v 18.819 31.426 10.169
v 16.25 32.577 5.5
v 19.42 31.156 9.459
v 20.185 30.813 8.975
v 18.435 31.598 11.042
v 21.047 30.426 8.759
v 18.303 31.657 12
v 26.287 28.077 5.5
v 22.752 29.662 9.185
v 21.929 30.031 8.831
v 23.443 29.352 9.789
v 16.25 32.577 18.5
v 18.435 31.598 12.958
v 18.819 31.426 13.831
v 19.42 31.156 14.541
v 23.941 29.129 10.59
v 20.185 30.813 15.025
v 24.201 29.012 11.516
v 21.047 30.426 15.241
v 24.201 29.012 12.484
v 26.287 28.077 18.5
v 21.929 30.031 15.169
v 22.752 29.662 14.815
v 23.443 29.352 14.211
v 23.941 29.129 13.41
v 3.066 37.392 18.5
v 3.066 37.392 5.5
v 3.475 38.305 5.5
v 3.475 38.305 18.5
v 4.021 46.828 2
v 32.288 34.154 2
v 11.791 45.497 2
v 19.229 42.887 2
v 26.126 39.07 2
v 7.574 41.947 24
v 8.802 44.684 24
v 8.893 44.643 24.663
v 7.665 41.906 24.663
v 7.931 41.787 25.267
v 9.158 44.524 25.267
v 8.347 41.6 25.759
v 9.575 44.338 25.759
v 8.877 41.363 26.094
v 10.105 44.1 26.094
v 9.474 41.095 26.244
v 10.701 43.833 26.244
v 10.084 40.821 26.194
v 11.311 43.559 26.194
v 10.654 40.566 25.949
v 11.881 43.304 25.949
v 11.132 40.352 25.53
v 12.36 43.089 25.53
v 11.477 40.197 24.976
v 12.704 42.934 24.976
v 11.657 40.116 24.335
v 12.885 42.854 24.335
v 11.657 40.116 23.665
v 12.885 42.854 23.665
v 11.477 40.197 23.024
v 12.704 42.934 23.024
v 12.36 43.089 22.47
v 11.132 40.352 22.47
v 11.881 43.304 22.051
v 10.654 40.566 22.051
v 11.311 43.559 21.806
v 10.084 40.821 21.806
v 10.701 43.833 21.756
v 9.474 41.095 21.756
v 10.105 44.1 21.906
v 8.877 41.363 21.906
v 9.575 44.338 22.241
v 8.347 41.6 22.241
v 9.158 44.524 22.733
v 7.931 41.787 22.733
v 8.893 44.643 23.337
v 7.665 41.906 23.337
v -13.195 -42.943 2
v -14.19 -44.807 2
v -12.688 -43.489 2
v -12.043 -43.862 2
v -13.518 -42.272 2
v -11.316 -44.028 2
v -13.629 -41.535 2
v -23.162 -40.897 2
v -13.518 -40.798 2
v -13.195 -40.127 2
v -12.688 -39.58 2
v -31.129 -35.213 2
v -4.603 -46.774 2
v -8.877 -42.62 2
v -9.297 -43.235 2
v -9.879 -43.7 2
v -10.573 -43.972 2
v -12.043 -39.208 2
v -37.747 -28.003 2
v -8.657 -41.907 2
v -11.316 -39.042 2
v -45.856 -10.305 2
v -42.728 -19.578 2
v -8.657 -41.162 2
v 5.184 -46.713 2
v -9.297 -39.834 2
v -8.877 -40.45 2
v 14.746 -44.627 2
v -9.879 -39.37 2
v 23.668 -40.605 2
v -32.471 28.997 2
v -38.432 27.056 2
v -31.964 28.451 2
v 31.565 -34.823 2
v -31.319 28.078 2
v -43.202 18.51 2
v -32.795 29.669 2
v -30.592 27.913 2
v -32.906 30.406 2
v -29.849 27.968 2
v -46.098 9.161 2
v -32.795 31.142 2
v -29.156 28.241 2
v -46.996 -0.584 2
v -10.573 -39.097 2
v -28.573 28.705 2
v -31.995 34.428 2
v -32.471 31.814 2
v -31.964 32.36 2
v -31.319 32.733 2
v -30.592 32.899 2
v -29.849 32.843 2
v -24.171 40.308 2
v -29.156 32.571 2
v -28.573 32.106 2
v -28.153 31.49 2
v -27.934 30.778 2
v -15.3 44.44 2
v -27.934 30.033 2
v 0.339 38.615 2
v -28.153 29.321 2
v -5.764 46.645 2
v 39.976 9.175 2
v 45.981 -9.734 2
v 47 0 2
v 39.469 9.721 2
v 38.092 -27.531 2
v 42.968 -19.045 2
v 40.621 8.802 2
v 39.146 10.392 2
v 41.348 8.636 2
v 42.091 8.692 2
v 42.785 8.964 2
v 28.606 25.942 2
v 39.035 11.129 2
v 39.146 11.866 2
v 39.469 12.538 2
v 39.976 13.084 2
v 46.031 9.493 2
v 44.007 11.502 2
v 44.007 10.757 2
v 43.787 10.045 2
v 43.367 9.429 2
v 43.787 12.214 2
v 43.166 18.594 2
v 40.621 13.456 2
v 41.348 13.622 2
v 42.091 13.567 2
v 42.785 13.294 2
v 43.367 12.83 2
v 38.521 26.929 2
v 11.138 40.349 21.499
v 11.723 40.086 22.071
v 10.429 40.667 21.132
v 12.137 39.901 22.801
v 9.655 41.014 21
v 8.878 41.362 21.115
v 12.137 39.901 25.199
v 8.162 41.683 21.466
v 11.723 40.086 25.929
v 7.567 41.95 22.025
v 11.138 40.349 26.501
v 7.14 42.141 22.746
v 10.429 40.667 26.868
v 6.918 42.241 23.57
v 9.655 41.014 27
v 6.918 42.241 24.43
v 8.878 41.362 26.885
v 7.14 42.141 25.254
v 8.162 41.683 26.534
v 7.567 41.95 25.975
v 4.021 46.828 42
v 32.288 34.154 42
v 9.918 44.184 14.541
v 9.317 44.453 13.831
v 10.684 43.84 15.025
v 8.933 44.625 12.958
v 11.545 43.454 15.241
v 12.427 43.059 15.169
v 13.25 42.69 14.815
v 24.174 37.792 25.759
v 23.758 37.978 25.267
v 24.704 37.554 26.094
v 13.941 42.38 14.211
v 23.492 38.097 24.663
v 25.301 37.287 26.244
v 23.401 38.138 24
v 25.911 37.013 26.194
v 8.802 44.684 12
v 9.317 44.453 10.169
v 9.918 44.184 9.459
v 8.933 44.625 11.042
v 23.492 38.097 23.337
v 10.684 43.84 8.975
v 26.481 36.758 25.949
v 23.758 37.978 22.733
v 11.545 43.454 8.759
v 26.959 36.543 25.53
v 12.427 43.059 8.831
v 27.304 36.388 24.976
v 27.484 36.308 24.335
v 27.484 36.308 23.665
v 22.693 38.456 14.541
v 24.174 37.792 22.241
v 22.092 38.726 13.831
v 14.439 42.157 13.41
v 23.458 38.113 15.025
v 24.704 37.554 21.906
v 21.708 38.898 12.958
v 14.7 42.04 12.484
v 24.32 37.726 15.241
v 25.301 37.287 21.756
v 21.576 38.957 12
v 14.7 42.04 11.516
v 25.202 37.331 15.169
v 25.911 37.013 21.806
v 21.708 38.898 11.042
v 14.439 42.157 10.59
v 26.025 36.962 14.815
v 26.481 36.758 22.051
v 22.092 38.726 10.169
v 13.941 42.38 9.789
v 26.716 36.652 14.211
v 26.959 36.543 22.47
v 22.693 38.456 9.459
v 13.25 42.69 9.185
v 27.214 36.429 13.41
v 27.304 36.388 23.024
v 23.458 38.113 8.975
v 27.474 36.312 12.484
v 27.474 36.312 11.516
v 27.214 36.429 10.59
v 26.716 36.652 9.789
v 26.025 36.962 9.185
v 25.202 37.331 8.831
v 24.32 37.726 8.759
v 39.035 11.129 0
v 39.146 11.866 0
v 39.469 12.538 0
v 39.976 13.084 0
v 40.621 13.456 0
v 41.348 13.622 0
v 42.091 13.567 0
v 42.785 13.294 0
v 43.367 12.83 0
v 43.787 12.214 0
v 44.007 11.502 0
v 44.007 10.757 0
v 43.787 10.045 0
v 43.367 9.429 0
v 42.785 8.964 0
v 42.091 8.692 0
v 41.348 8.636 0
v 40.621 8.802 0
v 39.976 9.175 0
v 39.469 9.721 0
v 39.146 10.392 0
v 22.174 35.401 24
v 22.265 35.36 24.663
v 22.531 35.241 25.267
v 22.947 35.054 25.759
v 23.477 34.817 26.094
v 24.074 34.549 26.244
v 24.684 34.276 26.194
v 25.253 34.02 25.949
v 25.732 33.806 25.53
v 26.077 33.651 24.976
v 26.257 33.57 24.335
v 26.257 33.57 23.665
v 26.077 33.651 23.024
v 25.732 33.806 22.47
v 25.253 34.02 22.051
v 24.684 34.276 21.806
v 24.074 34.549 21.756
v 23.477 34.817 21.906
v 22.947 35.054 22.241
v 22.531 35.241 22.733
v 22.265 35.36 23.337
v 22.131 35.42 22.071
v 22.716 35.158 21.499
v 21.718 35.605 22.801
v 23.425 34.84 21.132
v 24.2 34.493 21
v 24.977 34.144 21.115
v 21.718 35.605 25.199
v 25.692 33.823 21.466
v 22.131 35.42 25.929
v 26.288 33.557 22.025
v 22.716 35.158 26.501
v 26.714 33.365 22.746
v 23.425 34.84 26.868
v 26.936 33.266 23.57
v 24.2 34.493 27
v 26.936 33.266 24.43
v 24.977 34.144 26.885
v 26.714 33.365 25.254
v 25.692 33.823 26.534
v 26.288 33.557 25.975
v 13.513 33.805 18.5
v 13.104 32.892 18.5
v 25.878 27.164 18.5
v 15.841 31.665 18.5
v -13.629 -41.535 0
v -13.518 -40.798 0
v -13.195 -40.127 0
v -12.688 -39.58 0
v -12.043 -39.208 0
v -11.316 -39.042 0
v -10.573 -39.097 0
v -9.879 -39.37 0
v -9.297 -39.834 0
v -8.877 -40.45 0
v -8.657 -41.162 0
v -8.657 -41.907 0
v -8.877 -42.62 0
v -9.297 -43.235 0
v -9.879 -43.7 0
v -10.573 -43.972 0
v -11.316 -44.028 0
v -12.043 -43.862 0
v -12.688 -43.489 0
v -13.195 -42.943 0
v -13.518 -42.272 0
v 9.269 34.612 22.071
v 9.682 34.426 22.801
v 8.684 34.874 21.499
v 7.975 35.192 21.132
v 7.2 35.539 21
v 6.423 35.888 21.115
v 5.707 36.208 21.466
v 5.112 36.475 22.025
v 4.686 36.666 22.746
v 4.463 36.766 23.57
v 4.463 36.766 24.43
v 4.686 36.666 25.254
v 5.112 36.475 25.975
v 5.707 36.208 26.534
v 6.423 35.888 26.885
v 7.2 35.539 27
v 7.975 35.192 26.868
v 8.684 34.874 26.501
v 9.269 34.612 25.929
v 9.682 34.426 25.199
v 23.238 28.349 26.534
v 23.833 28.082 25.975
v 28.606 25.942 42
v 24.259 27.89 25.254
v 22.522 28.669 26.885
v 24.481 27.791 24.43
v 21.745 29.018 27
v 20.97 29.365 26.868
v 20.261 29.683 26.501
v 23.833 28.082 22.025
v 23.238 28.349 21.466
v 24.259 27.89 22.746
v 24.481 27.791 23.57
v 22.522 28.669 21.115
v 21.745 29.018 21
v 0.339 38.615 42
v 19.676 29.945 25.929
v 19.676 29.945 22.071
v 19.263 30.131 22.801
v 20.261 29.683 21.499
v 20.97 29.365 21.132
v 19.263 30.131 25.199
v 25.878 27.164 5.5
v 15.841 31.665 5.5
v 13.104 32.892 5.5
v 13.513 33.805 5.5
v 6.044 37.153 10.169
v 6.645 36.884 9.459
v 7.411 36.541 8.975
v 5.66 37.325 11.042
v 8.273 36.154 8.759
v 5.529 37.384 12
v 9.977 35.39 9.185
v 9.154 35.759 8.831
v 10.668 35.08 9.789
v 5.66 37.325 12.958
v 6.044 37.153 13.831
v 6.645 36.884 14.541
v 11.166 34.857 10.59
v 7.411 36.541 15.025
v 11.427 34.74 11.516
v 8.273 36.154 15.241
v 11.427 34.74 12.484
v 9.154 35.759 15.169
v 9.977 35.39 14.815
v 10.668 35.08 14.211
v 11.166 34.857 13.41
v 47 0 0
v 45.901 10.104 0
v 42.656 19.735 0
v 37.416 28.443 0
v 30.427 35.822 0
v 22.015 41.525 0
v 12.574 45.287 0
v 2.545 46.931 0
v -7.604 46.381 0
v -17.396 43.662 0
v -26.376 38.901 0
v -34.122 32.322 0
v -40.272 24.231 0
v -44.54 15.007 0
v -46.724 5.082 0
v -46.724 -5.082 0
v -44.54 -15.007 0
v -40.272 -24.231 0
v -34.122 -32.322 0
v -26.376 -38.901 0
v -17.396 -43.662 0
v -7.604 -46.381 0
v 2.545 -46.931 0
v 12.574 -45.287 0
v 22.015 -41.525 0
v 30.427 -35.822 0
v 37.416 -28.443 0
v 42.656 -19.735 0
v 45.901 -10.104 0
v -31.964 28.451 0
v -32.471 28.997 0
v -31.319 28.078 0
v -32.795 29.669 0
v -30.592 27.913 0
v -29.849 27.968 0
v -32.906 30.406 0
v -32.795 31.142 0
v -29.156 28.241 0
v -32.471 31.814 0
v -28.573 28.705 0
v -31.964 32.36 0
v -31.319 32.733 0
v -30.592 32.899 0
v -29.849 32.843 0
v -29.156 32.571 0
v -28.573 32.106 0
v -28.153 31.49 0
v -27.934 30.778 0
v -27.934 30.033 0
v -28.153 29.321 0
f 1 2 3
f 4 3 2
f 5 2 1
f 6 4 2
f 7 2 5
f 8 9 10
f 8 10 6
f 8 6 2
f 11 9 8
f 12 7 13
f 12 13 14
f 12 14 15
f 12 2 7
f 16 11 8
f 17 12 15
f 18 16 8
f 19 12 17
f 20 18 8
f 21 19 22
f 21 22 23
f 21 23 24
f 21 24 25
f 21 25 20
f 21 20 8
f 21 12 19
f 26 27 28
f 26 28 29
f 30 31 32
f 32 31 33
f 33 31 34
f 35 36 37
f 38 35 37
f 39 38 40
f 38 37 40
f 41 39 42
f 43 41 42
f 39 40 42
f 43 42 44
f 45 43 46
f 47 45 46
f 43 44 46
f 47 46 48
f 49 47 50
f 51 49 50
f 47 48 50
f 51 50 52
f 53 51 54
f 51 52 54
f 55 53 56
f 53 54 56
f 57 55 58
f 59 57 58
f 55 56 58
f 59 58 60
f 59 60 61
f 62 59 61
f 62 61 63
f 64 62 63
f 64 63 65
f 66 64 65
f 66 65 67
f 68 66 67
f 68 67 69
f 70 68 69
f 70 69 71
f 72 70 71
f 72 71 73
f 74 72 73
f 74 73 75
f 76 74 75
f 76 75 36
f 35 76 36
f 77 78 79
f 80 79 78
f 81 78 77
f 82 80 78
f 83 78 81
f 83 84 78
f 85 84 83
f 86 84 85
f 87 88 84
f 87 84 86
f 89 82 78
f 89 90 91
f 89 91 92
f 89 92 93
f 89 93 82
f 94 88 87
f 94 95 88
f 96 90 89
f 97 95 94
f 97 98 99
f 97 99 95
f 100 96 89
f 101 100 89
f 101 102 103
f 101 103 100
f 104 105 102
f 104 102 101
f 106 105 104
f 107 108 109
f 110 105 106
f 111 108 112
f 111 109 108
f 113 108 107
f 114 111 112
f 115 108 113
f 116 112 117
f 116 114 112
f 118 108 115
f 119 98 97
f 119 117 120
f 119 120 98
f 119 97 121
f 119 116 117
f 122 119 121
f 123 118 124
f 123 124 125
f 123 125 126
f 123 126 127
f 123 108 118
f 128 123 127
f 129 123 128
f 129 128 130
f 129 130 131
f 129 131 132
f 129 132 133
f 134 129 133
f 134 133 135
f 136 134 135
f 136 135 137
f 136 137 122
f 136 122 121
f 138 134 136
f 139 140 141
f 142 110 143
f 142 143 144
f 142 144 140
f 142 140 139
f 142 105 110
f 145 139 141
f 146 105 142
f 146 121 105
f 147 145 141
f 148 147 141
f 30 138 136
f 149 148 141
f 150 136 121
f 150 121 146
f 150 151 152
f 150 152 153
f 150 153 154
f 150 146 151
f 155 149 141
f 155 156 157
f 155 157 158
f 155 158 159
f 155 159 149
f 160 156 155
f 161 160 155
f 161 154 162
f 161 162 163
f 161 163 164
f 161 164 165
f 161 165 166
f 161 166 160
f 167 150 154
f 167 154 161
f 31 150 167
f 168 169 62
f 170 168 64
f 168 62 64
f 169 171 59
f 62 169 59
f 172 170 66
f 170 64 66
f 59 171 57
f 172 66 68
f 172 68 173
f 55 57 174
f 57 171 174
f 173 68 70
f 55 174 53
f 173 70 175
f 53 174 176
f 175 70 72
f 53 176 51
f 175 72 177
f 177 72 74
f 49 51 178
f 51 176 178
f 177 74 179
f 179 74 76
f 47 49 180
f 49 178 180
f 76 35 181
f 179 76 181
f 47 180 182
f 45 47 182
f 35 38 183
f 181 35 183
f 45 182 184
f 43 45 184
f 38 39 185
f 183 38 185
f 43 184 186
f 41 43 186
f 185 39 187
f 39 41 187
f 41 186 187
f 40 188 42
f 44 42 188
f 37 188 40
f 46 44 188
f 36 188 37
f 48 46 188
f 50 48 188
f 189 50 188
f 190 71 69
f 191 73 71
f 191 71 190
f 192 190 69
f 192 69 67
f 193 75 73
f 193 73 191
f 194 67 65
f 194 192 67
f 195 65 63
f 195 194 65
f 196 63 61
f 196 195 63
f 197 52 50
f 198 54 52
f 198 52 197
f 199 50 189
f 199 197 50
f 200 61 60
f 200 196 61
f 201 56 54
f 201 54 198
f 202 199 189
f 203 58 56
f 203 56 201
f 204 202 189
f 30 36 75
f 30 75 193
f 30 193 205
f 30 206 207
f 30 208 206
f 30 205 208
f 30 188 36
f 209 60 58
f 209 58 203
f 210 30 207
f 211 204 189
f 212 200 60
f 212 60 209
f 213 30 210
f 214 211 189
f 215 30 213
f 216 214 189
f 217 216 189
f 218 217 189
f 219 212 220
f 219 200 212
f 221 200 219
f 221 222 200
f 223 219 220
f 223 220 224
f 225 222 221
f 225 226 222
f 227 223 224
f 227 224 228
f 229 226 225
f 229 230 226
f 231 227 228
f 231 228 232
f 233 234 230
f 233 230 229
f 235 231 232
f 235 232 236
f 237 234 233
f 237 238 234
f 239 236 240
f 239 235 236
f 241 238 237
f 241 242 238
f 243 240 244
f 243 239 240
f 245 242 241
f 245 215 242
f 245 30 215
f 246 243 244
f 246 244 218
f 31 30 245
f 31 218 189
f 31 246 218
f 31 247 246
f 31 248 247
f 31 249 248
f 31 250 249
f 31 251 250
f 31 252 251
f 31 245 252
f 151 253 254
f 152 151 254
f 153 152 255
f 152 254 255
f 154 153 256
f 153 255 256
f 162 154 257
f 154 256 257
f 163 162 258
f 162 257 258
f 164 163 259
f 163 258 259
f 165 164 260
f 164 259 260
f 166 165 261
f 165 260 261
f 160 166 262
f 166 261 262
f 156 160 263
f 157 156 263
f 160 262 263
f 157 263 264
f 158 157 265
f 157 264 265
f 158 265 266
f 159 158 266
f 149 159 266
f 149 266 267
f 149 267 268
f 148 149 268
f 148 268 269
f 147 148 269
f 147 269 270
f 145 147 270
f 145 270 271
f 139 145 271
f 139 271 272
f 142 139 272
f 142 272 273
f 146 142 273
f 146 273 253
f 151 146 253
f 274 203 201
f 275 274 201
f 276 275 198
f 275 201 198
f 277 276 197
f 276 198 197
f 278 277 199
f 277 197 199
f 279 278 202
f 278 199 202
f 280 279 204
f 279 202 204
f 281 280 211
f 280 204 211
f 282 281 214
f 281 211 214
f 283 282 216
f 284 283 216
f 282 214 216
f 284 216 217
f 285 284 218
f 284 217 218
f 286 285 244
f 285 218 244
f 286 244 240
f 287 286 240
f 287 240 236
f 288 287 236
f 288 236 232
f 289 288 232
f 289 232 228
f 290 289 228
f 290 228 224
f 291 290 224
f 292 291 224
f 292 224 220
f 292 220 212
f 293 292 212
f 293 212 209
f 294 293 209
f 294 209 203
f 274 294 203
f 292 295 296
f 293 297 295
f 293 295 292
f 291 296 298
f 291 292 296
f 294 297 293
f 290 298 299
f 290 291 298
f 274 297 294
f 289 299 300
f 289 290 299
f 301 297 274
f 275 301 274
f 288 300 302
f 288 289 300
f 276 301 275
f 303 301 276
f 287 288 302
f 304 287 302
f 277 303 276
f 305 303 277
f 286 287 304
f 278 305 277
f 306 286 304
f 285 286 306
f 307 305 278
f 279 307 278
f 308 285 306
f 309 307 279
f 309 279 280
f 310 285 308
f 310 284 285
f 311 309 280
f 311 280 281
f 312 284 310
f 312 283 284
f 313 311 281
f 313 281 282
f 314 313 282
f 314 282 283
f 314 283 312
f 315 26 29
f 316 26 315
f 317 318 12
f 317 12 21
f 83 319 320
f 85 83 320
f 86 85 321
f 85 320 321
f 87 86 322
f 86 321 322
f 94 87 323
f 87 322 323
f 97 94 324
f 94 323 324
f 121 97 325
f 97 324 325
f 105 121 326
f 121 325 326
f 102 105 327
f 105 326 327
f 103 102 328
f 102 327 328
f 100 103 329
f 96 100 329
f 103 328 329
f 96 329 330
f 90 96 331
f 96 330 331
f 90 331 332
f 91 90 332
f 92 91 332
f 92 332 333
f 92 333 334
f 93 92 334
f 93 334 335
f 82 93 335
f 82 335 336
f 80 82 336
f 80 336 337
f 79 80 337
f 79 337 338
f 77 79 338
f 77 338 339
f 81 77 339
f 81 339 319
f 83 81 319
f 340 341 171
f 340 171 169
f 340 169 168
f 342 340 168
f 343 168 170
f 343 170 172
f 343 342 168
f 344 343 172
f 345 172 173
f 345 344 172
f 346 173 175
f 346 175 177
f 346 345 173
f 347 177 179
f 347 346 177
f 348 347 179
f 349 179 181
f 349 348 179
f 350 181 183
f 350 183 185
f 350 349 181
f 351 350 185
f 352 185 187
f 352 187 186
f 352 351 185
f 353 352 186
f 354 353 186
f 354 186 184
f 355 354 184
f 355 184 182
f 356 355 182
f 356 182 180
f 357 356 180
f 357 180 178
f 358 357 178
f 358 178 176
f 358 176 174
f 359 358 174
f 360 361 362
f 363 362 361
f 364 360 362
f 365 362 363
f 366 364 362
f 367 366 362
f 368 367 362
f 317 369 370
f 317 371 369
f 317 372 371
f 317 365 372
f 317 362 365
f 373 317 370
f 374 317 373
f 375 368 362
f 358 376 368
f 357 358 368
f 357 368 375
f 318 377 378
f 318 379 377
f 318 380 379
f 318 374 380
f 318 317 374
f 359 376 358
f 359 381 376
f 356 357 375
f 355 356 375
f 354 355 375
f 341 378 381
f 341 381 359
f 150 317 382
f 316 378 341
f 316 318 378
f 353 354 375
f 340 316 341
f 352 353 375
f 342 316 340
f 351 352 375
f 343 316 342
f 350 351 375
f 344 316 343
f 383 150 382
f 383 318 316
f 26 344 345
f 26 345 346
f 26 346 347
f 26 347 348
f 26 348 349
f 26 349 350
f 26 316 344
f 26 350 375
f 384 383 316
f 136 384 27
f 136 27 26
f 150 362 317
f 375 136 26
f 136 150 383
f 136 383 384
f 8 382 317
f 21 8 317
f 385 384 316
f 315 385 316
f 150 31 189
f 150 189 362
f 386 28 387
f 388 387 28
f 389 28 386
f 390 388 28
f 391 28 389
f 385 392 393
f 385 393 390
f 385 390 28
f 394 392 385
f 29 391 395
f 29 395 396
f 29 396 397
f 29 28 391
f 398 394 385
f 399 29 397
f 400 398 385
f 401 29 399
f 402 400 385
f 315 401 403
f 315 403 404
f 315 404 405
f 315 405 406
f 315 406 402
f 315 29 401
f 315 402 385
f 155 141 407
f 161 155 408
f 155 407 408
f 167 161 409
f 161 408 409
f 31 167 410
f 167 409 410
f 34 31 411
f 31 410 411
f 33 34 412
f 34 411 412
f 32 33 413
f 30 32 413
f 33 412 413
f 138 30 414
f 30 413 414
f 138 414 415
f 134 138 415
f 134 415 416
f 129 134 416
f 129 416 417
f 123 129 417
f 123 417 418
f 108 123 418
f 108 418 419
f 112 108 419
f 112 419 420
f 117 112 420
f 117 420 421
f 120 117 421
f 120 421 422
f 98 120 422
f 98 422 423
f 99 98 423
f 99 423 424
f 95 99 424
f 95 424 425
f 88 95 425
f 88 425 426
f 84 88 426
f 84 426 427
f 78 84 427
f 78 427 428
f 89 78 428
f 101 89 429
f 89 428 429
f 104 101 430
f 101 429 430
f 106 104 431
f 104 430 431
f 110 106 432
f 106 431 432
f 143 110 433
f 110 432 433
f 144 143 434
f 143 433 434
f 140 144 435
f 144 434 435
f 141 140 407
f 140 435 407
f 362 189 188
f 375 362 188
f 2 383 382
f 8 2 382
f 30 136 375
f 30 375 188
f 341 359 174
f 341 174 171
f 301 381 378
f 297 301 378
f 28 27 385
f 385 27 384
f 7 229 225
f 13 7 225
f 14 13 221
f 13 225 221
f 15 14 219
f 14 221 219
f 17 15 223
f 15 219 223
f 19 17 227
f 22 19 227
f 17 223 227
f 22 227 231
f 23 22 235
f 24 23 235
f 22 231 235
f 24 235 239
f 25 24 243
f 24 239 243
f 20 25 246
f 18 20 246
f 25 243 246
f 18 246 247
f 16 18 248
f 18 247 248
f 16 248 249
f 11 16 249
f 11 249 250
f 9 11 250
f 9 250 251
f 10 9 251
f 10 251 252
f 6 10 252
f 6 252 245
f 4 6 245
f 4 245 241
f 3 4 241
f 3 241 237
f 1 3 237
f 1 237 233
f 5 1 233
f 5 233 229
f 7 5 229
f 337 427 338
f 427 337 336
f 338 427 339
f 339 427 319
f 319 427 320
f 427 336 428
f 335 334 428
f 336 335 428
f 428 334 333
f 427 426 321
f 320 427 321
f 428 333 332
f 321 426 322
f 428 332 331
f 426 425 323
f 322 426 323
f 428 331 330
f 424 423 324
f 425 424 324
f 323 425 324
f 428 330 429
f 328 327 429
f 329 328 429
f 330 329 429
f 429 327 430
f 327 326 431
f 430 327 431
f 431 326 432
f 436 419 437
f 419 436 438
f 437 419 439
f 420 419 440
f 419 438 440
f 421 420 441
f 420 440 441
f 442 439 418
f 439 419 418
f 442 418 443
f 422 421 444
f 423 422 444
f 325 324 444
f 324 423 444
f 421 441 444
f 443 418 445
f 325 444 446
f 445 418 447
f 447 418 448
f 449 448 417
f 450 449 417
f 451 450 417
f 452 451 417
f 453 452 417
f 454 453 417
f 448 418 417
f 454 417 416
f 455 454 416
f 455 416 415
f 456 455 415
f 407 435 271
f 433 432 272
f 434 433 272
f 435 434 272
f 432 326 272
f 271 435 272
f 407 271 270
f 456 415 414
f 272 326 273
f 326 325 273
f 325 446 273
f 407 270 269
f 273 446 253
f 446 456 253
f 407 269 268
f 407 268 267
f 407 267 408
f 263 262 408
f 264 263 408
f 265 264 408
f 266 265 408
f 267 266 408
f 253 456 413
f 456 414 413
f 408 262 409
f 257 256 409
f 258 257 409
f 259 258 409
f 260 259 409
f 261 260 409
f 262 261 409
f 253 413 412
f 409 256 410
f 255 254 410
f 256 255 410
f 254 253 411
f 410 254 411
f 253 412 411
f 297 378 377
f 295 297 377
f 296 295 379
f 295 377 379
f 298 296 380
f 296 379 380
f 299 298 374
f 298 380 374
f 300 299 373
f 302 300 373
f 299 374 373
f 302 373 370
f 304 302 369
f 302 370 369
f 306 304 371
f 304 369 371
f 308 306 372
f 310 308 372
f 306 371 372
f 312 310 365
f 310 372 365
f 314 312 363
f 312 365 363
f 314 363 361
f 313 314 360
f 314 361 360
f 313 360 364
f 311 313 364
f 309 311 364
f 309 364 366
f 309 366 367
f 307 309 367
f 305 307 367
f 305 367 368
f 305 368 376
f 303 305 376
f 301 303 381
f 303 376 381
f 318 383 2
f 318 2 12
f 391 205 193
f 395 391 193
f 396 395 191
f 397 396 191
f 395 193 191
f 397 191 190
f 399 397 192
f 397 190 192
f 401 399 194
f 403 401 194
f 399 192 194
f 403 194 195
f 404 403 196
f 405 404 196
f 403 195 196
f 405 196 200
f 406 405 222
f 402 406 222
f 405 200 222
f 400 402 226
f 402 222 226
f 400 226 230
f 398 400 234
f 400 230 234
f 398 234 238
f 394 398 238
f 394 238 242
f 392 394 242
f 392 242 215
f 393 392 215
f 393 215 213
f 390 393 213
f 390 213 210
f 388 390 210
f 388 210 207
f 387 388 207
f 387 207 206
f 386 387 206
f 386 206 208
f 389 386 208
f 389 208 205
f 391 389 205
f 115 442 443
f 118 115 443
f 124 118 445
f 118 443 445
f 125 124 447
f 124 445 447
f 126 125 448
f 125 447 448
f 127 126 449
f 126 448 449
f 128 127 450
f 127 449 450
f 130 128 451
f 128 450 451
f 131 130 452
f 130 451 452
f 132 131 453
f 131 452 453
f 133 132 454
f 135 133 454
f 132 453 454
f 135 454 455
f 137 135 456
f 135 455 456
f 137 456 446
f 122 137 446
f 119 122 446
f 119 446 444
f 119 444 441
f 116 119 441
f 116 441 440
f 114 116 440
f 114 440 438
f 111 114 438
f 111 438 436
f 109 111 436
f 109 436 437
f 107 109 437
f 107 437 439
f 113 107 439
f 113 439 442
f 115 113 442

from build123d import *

# Parameters (mm, degrees)
SKETCH1_R           = 47
BOSS_EXTRUDE1_DEPTH = 2
SKETCH3_R           = 2.5
CUT_EXTRUDE1_DEPTH  = 67.498120274
BOSS_EXTRUDE2_DEPTH = 40
CUT_EXTRUDE3_REACH  = 118.892
SKETCH8_R           = 3.25
SKETCH8_R_2         = 2.25
SKETCH9_W           = 11
SKETCH9_H           = 13
CUT_EXTRUDE4_DEPTH  = 1
CUT_EXTRUDE5_DEPTH  = 6


with BuildPart() as part:
    # Sketch1 → Boss-Extrude1 (new body)
    with BuildSketch(Plane.XY):
        Circle(SKETCH1_R)
    extrude(amount=BOSS_EXTRUDE1_DEPTH)

    # Sketch3 → Cut-Extrude1 (cut, through all)
    with BuildSketch(Plane(origin=(0, 0, 0), x_dir=(-1, 0, 0), z_dir=(0, 0, -1))):
        with Locations((30.405591591, 30.405591591)):
            Circle(SKETCH3_R)
        with Locations((11.129218939, -41.53481053)):
            Circle(SKETCH3_R)
        with Locations((-41.53481053, 11.129218939)):
            Circle(SKETCH3_R)
    extrude(amount=-CUT_EXTRUDE1_DEPTH, mode=Mode.SUBTRACT)

    # Sketch4 → Boss-Extrude2 (add)
    with BuildSketch(Plane.XY.offset(2)):
        Polygon((4.020989493, 46.827680313), (32.287890293, 34.153947655), (28.605815439, 25.941620045), (0.338914639, 38.615352703), align=None)
    extrude(amount=BOSS_EXTRUDE2_DEPTH)

    # Sketch8 → Cut-Extrude3 (cut, up to next)
    with BuildSketch(Plane(origin=(18.154439893, 40.490813984, 0), x_dir=(0.9124808455439009, -0.4091194281814147, 0), z_dir=(0.4091194281814148, 0.912480845543901, 0)), mode=Mode.PRIVATE) as cut_extrude3_sk1:
        with Locations(Location((7, -12, 0), (0, 0, 180))):
            Circle(SKETCH8_R)
    cut_extrude3_tool1 = extrude(cut_extrude3_sk1.sketch, amount=-CUT_EXTRUDE3_REACH, mode=Mode.PRIVATE) & part.part
    # Sketch8 → Cut-Extrude3 (cut, up to next)
    with BuildSketch(Plane(origin=(18.154439893, 40.490813984, 0), x_dir=(0.9124808455439009, -0.4091194281814147, 0), z_dir=(0.4091194281814148, 0.912480845543901, 0)), mode=Mode.PRIVATE) as cut_extrude3_sk2:
        with Locations(Location((-7, -12, 0), (0, 0, 180))):
            Circle(SKETCH8_R)
    cut_extrude3_tool2 = extrude(cut_extrude3_sk2.sketch, amount=-CUT_EXTRUDE3_REACH, mode=Mode.PRIVATE) & part.part
    # Sketch8 → Cut-Extrude3 (cut, up to next)
    with BuildSketch(Plane(origin=(18.154439893, 40.490813984, 0), x_dir=(0.9124808455439009, -0.4091194281814147, 0), z_dir=(0.4091194281814148, 0.912480845543901, 0)), mode=Mode.PRIVATE) as cut_extrude3_sk3:
        with Locations(Location((8, -24, 0), (0, 0, 180))):
            Circle(SKETCH8_R_2)
    cut_extrude3_tool3 = extrude(cut_extrude3_sk3.sketch, amount=-CUT_EXTRUDE3_REACH, mode=Mode.PRIVATE) & part.part
    # Sketch8 → Cut-Extrude3 (cut, up to next)
    with BuildSketch(Plane(origin=(18.154439893, 40.490813984, 0), x_dir=(0.9124808455439009, -0.4091194281814147, 0), z_dir=(0.4091194281814148, 0.912480845543901, 0)), mode=Mode.PRIVATE) as cut_extrude3_sk4:
        with Locations(Location((-8, -24, 0), (0, 0, 180))):
            Circle(SKETCH8_R_2)
    cut_extrude3_tool4 = extrude(cut_extrude3_sk4.sketch, amount=-CUT_EXTRUDE3_REACH, mode=Mode.PRIVATE) & part.part
    add(cut_extrude3_tool1.solids().sort_by_distance((24.541806, 37.626978, 12))[0], mode=Mode.SUBTRACT)
    add(cut_extrude3_tool2.solids().sort_by_distance((11.767074, 43.35465, 12))[0], mode=Mode.SUBTRACT)
    add(cut_extrude3_tool3.solids().sort_by_distance((25.454287, 37.217859, 24))[0], mode=Mode.SUBTRACT)
    add(cut_extrude3_tool4.solids().sort_by_distance((10.854593, 43.763769, 24))[0], mode=Mode.SUBTRACT)

    # Sketch9 → Cut-Extrude4 (cut)
    with BuildSketch(Plane(origin=(14.472365039, 32.278486374, 0), x_dir=(0.9124808455439007, -0.40911942818141506, 0), z_dir=(-0.40911942818141506, -0.9124808455439007, 0))):
        with Locations((-7, 12)):
            Rectangle(SKETCH9_W, SKETCH9_H)
        with Locations((7, 12)):
            Rectangle(SKETCH9_W, SKETCH9_H)
    extrude(amount=-CUT_EXTRUDE4_DEPTH, mode=Mode.SUBTRACT)

    # Sketch10 → Cut-Extrude5 (cut)
    with BuildSketch(Plane(origin=(14.472365039, 32.278486374, 0), x_dir=(0.9124808455439007, -0.40911942818141506, 0), z_dir=(-0.40911942818141506, -0.9124808455439007, 0))):
        with BuildLine():
            Line((5.25, 25.198957881), (5.25, 22.801042119))
            ThreePointArc((5.25, 22.801042119), (11, 24), (5.25, 25.198957881))
        make_face()
        with BuildLine():
            Line((-5.25, 25.198957881), (-5.25, 22.801042119))
            ThreePointArc((-5.25, 22.801042119), (-11, 24), (-5.25, 25.198957881))
        make_face()
    extrude(amount=-CUT_EXTRUDE5_DEPTH, mode=Mode.SUBTRACT)


solid = part.part
